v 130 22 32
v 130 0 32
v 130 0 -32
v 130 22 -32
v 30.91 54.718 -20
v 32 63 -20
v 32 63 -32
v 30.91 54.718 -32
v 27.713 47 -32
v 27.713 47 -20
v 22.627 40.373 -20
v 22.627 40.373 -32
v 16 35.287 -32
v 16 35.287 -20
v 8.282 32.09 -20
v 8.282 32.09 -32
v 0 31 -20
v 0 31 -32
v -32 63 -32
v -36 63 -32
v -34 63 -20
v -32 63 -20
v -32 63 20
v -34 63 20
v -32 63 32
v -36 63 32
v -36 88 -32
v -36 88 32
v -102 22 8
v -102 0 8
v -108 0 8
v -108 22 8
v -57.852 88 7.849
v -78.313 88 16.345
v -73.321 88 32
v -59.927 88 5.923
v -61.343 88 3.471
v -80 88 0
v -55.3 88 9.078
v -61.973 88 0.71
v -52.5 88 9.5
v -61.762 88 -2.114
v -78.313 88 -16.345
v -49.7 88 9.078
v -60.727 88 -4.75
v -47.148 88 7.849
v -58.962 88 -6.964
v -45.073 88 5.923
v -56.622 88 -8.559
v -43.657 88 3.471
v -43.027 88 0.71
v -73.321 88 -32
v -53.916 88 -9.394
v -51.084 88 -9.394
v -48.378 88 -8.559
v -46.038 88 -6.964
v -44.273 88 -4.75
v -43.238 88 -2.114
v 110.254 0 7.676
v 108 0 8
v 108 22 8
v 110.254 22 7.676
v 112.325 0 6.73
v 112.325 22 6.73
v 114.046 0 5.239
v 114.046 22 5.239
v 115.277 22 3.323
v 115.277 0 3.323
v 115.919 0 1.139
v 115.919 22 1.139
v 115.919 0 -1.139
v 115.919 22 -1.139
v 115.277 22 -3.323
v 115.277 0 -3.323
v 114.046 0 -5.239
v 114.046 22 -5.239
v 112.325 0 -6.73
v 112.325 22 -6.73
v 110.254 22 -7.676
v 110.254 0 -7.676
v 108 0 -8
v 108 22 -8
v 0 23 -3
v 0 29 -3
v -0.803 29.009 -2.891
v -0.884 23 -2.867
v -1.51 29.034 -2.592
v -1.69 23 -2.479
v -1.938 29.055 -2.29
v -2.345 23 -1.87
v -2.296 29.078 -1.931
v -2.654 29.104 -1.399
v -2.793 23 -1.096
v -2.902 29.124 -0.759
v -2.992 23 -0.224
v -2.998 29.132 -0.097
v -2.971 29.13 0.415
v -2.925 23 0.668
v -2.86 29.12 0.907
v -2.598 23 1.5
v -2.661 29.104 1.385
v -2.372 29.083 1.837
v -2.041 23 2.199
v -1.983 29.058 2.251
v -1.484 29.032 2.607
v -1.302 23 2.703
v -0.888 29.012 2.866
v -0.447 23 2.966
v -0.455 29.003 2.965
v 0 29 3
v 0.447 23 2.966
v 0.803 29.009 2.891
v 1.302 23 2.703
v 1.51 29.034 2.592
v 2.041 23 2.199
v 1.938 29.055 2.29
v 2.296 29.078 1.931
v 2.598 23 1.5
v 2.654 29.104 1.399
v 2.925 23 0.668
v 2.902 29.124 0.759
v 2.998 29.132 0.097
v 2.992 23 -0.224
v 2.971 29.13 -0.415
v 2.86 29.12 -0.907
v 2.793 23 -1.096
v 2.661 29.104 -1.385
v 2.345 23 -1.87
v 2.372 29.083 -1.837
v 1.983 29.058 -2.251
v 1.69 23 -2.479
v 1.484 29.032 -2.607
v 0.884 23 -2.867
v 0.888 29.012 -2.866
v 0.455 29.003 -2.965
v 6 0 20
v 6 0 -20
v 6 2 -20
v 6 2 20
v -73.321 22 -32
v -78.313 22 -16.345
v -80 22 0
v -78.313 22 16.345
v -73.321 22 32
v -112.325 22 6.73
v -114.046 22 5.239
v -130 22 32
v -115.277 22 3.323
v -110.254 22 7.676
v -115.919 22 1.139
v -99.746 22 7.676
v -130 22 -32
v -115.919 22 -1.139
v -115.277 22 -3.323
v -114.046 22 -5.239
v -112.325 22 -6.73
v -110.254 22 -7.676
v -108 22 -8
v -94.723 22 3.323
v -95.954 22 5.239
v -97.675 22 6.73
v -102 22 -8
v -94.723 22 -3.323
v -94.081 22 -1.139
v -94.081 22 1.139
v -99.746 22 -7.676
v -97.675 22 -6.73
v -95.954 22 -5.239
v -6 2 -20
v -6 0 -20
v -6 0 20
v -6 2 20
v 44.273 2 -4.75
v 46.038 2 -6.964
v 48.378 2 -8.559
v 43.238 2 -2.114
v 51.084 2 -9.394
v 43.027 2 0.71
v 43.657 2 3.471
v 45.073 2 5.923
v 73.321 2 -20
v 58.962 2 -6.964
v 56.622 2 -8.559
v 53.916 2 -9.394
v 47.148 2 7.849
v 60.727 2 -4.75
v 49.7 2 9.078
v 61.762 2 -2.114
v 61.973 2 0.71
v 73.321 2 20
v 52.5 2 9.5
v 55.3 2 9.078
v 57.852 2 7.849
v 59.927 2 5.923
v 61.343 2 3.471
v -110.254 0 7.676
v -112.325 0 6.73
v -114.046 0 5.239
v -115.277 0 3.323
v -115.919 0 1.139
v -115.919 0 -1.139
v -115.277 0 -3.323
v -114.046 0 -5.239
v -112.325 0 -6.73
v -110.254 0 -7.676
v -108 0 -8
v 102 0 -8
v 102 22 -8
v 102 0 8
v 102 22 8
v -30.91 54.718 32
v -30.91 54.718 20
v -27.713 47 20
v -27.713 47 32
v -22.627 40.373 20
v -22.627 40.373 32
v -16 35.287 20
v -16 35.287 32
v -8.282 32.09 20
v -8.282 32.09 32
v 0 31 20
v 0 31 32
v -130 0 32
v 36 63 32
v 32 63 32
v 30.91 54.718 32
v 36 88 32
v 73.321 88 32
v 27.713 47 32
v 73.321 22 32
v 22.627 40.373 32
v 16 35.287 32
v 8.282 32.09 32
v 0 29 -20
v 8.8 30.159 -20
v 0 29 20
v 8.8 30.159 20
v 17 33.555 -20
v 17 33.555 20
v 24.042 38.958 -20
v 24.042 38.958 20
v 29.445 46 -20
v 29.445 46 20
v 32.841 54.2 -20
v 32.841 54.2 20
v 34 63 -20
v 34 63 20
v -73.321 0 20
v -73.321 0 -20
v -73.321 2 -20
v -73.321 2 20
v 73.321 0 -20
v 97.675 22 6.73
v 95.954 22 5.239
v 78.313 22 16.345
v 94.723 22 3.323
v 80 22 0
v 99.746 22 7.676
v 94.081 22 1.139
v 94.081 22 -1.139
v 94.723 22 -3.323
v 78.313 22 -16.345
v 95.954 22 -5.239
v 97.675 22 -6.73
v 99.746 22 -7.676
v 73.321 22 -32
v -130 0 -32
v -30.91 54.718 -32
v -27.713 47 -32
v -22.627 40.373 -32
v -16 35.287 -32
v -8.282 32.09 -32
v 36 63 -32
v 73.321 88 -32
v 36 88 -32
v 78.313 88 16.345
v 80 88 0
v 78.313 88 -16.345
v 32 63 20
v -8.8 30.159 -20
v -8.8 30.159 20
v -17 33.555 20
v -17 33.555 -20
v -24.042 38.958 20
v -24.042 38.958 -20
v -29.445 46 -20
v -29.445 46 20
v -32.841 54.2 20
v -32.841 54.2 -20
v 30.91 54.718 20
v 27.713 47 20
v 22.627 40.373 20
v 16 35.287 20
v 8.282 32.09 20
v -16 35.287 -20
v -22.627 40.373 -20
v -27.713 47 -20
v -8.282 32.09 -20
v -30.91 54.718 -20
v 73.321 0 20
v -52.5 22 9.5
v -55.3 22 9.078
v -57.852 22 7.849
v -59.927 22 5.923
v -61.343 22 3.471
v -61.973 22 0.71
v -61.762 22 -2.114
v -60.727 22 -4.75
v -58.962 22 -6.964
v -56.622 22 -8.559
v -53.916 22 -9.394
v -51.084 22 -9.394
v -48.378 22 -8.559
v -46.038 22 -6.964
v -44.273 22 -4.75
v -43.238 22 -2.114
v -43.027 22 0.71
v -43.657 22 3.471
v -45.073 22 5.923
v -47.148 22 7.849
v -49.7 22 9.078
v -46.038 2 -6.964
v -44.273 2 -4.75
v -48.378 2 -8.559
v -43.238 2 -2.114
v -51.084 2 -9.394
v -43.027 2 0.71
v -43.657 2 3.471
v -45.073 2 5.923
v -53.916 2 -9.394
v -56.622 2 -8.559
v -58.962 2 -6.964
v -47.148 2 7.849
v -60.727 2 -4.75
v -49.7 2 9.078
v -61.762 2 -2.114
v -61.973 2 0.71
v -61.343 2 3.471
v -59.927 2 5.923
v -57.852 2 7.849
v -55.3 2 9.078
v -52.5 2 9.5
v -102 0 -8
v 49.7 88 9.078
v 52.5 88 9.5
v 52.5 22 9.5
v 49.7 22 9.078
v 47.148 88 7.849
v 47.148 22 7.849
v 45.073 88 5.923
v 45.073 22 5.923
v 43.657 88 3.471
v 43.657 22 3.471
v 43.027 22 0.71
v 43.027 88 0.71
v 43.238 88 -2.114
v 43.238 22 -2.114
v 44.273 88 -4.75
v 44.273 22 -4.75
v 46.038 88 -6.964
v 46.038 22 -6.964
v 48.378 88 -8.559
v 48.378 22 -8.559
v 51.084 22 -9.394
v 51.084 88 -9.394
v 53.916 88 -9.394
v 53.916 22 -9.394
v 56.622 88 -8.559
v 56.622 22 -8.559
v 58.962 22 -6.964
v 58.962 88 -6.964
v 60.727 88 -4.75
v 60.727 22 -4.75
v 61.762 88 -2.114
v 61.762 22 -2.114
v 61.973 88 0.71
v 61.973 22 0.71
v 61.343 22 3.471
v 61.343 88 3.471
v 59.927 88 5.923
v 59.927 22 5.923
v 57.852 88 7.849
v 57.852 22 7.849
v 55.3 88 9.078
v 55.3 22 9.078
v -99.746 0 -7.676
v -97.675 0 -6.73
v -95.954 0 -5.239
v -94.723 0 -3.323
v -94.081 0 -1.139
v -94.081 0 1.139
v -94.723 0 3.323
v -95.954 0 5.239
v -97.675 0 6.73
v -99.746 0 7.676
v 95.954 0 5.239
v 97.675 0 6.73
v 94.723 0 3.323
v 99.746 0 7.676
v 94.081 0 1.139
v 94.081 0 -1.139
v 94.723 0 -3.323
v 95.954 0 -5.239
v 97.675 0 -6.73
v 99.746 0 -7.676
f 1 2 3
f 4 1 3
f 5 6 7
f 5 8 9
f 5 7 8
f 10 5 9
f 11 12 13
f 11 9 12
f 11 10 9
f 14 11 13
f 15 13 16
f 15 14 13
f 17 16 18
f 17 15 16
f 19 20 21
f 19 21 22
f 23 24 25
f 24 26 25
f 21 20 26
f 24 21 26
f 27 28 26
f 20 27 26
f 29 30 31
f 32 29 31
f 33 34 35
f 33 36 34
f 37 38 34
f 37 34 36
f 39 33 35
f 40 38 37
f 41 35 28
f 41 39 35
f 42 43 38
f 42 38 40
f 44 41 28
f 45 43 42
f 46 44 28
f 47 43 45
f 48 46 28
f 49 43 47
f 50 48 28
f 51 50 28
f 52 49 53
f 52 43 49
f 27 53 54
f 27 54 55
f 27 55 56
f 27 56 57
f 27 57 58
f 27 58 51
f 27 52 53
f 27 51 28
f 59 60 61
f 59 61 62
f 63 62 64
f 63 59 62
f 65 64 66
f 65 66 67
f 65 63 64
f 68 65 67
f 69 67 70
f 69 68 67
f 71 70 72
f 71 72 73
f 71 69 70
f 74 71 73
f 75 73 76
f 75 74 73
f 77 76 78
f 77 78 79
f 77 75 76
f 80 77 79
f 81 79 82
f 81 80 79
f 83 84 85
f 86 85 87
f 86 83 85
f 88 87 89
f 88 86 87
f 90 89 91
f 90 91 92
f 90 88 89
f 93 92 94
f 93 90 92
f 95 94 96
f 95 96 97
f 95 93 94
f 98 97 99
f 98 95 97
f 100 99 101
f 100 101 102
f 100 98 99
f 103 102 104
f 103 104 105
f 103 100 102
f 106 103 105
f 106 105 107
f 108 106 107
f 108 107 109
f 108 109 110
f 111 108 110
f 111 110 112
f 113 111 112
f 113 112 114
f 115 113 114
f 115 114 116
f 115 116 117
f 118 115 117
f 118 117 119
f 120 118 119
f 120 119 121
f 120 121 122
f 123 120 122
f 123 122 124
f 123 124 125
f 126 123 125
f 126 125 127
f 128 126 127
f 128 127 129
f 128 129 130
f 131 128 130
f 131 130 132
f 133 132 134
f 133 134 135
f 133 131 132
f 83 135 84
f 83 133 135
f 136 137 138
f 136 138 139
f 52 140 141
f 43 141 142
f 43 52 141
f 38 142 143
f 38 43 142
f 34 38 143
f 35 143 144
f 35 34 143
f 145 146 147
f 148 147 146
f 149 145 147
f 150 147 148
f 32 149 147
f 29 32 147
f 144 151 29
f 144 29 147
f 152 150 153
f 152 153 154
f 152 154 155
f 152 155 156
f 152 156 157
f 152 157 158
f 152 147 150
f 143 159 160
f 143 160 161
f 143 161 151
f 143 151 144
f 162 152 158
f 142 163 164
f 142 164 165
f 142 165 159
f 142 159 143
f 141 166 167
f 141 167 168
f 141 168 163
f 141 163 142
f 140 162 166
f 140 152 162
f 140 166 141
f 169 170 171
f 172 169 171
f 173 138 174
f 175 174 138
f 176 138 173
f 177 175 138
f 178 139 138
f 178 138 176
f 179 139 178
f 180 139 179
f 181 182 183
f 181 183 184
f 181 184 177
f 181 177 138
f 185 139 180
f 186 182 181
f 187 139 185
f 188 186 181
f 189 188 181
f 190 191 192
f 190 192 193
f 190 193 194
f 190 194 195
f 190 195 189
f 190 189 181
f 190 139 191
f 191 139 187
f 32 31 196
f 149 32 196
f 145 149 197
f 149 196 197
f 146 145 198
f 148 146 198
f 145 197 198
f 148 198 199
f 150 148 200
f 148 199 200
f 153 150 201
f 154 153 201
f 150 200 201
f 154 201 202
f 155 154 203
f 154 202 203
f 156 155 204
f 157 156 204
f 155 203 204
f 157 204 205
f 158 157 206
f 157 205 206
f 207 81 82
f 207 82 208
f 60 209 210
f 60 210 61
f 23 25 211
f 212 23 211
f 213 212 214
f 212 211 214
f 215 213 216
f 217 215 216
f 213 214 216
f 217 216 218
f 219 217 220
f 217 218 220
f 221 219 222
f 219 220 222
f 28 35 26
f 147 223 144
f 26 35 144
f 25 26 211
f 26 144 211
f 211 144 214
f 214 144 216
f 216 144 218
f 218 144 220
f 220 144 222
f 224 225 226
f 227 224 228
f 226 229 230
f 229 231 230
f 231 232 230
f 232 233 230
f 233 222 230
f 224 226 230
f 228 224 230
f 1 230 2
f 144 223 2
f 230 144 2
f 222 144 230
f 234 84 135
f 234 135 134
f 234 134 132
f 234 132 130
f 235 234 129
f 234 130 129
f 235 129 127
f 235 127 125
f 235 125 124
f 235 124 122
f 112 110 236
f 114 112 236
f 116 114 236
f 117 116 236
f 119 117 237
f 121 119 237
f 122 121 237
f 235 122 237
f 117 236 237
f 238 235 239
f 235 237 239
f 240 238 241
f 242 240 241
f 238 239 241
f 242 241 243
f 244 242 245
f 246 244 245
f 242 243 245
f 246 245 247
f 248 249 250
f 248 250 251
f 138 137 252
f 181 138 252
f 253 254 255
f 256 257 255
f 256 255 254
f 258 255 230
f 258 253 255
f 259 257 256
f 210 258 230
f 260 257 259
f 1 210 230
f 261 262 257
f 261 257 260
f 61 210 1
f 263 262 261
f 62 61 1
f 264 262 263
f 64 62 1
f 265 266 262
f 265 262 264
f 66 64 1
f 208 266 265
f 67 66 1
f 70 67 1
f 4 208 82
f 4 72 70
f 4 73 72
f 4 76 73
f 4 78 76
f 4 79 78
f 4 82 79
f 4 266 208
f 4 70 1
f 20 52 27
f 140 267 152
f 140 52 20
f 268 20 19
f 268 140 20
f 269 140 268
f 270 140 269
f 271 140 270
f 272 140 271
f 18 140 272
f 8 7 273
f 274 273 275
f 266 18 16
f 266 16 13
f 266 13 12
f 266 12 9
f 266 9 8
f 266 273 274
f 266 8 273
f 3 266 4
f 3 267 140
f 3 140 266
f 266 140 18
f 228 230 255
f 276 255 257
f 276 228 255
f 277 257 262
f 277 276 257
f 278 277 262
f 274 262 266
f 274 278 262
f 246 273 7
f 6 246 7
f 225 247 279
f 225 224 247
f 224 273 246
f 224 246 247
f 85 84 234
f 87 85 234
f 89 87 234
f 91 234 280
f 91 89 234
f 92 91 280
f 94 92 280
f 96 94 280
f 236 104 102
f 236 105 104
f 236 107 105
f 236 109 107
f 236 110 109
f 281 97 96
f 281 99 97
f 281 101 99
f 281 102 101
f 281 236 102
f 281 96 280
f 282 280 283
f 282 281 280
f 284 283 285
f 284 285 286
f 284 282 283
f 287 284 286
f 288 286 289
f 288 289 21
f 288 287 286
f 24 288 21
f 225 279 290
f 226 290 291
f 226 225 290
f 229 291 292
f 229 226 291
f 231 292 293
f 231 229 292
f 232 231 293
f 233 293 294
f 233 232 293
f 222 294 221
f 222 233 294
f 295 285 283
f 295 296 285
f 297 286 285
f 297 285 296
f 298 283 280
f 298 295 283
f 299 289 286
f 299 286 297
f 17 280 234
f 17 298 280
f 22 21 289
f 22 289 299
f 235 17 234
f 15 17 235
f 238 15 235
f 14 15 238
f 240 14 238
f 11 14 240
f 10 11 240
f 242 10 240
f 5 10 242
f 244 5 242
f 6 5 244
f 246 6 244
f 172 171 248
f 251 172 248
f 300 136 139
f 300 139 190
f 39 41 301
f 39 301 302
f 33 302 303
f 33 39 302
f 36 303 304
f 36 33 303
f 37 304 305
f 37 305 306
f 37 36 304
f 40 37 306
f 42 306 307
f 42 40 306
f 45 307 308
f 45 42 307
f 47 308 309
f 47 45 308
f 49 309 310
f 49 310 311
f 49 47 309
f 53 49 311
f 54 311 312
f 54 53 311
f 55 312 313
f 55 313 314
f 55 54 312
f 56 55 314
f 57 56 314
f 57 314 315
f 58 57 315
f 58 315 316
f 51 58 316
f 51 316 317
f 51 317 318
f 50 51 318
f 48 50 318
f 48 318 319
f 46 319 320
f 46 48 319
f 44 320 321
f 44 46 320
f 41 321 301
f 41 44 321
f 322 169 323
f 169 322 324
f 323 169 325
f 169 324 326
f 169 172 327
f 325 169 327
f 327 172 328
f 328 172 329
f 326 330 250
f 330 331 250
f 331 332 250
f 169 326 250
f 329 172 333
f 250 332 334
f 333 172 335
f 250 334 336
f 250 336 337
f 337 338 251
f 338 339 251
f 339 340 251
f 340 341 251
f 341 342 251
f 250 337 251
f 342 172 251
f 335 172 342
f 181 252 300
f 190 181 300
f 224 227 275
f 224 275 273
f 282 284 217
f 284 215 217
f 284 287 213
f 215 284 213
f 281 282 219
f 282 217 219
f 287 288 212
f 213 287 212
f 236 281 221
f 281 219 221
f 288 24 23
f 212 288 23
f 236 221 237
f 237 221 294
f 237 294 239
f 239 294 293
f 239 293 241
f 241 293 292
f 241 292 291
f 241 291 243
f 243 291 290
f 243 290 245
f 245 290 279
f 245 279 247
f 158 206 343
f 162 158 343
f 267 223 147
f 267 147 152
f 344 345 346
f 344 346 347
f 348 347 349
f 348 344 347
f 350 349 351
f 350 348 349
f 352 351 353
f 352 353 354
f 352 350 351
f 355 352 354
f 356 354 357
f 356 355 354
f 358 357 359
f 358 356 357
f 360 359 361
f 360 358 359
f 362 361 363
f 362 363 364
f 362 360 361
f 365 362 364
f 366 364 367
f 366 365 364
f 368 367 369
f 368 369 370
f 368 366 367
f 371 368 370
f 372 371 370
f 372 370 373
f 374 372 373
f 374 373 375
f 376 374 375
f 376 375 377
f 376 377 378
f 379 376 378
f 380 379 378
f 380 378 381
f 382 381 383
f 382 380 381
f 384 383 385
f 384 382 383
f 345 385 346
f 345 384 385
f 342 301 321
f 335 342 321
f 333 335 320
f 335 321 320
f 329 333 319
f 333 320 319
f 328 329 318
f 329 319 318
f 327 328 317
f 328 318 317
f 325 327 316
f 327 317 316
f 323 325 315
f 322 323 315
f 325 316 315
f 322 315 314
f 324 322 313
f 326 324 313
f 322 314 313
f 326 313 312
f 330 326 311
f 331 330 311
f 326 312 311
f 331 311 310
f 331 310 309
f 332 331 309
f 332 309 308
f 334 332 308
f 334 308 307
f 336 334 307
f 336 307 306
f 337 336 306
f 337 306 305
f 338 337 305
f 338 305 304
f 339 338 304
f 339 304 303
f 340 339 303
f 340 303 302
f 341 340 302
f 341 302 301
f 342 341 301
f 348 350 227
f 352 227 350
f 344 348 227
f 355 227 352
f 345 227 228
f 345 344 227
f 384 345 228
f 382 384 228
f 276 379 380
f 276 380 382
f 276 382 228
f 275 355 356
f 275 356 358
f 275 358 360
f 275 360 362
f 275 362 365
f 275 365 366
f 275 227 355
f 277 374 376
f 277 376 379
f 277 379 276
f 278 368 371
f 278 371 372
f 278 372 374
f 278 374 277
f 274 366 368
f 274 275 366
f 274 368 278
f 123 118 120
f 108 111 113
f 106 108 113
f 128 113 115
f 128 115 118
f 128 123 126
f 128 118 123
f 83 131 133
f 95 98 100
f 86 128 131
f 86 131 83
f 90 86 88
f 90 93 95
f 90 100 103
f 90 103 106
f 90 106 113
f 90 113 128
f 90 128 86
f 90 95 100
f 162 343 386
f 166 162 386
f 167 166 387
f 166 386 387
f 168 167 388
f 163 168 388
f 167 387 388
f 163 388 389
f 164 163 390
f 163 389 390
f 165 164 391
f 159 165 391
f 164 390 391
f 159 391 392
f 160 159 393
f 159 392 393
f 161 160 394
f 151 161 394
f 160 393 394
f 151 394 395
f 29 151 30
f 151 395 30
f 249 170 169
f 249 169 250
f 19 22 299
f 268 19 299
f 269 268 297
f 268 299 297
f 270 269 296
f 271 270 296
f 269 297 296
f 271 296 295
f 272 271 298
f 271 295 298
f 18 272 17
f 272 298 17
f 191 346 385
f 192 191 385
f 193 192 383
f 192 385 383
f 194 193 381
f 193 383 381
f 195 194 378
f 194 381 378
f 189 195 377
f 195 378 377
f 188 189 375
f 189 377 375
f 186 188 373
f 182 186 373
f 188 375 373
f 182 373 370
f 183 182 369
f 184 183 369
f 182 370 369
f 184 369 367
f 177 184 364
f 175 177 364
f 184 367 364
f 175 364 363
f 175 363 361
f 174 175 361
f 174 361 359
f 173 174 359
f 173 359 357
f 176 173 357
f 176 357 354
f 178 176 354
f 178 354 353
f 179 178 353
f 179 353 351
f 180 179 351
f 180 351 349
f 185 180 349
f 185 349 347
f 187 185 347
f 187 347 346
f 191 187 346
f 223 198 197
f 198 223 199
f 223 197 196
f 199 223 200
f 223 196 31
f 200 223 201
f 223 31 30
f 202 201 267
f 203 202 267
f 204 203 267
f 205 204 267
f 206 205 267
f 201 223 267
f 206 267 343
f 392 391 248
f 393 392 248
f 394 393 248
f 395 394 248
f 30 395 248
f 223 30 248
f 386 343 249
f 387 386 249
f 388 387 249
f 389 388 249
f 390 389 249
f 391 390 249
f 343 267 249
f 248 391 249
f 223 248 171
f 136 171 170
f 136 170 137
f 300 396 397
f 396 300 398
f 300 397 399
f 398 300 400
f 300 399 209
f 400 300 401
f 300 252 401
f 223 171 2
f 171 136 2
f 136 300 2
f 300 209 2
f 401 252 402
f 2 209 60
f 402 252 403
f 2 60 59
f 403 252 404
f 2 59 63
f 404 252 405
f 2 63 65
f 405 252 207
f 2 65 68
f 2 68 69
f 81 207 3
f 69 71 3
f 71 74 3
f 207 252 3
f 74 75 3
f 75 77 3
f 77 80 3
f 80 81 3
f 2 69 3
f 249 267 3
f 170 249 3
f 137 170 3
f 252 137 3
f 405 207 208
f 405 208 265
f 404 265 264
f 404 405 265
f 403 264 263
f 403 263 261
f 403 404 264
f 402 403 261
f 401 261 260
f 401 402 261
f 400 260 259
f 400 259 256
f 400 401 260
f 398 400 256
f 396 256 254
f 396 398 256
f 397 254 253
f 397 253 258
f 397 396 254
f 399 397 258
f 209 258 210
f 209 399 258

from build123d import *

# Parameters (mm, degrees)
SKETCH1_W               = 260
SKETCH1_H               = 64
BOSS_EXTRUDE1_DEPTH     = 22
SKETCH3_R               = 9.5
BOSS_EXTRUDE2_DEPTH     = 66
CUT_EXTRUDE2_DEPTH      = 75
CUT_EXTRUDE3_DEPTH      = 20
CUT_EXTRUDE5_DEPTH      = 40
CUT_EXTRUDE5_DEPTH_BACK = 6
SKETCH7_R               = 3
SKETCH8_W               = 67.321211119
SKETCH8_H               = 40
CUT_EXTRUDE6_DEPTH      = 2
SKETCH9_R               = 9.5
CUT_EXTRUDE7_DEPTH      = 45


with BuildPart() as part:
    # Sketch1 → Boss-Extrude1 (new body)
    with BuildSketch(Plane(origin=(0, 0, 0), x_dir=(1, 0, 0), z_dir=(0, 1, 0))):
        Rectangle(SKETCH1_W, SKETCH1_H)
        with BuildLine():
            Line((-102, -8), (-108, -8))
            ThreePointArc((-108, -8), (-116, 0), (-108, 8))
            Line((-108, 8), (-102, 8))
            ThreePointArc((-102, 8), (-94, 0), (-102, -8))
        make_face(mode=Mode.SUBTRACT)
        with BuildLine():
            Line((102, -8), (108, -8))
            ThreePointArc((108, -8), (116, 0), (108, 8))
            Line((108, 8), (102, 8))
            ThreePointArc((102, 8), (94, 0), (102, -8))
        make_face(mode=Mode.SUBTRACT)
    extrude(amount=BOSS_EXTRUDE1_DEPTH)

    # Sketch3 → Boss-Extrude2 (add)
    with BuildSketch(Plane(origin=(0, 88, 0), x_dir=(-1, 0, 0), z_dir=(0, -1, 0))):
        with BuildLine():
            Line((73.321211119, -32), (-73.321211119, -32))
            ThreePointArc((-73.321211119, -32), (-80, 0), (-73.321211119, 32))
            Line((-73.321211119, 32), (73.321211119, 32))
            ThreePointArc((73.321211119, 32), (80, 0), (73.321211119, -32))
        make_face()
        with Locations(Location((-52.5, 0, 0), (0, 0, 270))):
            Circle(SKETCH3_R, mode=Mode.SUBTRACT)
        with Locations(Location((52.5, 0, 0), (0, 0, 270))):
            Circle(SKETCH3_R, mode=Mode.SUBTRACT)
    extrude(amount=BOSS_EXTRUDE2_DEPTH)

    # Sketch5 → Cut-Extrude2 (cut)
    with BuildSketch(Plane.XY.offset(32)):
        with BuildLine():
            Line((-36, 63), (-32, 63))
            ThreePointArc((-32, 63), (-22.627416998, 40.372583002), (0, 31))
            Line((0, 31), (0, 88))
            Line((0, 88), (-36, 88))
            Line((-36, 88), (-36, 63))
        make_face()
    cut_extrude2 = extrude(amount=-CUT_EXTRUDE2_DEPTH, mode=Mode.SUBTRACT)

    # Sketch6 → Cut-Extrude3 (cut, symmetric)
    with BuildSketch(Plane.XY):
        with BuildLine():
            Line((-34, 63), (0, 63))
            Line((0, 63), (0, 29))
            ThreePointArc((0, 29), (-24.04163056, 38.95836944), (-34, 63))
        make_face()
    cut_extrude3 = extrude(amount=CUT_EXTRUDE3_DEPTH, both=True, mode=Mode.SUBTRACT)

    # Mirror1: Cut-Extrude2, Cut-Extrude3 across plane
    add(cut_extrude2.mirror(Plane(origin=(0, 0, 0), x_dir=(0, 0, 1), z_dir=(1, 0, 0))), mode=Mode.SUBTRACT)
    add(cut_extrude3.mirror(Plane(origin=(0, 0, 0), x_dir=(0, 0, 1), z_dir=(1, 0, 0))), mode=Mode.SUBTRACT)

    # Sketch7 → Cut-Extrude5 (cut, two sides: drawn at the far end of the back side and taken through both)
    with BuildSketch(Plane(origin=(0, 29, 0), x_dir=(1, 0, 0), z_dir=(0, 1, 0)).offset(-CUT_EXTRUDE5_DEPTH_BACK)):
        with Locations(Location((0, 0, 0), (0, 0, 90))):
            Circle(SKETCH7_R)
    extrude(amount=CUT_EXTRUDE5_DEPTH + CUT_EXTRUDE5_DEPTH_BACK, mode=Mode.SUBTRACT)

    # Sketch8 → Cut-Extrude6 (cut)
    with BuildSketch(Plane.XZ):
        with Locations((39.66060556, 0)):
            Rectangle(SKETCH8_W, SKETCH8_H)
    cut_extrude6 = extrude(amount=-CUT_EXTRUDE6_DEPTH, mode=Mode.SUBTRACT)

    # Mirror2: Cut-Extrude6 across plane
    add(cut_extrude6.mirror(Plane(origin=(0, 0, 0), x_dir=(0, 0, 1), z_dir=(1, 0, 0))), mode=Mode.SUBTRACT)

    # Sketch9 → Cut-Extrude7 (cut)
    with BuildSketch(Plane(origin=(0, 22, 0), x_dir=(1, 0, 0), z_dir=(0, 1, 0))):
        with Locations(Location((-52.5, 0, 0), (0, 0, 270))):
            Circle(SKETCH9_R)
        with Locations(Location((52.5, 0, 0), (0, 0, 270))):
            Circle(SKETCH9_R)
    extrude(amount=-CUT_EXTRUDE7_DEPTH, mode=Mode.SUBTRACT)


solid = part.part
